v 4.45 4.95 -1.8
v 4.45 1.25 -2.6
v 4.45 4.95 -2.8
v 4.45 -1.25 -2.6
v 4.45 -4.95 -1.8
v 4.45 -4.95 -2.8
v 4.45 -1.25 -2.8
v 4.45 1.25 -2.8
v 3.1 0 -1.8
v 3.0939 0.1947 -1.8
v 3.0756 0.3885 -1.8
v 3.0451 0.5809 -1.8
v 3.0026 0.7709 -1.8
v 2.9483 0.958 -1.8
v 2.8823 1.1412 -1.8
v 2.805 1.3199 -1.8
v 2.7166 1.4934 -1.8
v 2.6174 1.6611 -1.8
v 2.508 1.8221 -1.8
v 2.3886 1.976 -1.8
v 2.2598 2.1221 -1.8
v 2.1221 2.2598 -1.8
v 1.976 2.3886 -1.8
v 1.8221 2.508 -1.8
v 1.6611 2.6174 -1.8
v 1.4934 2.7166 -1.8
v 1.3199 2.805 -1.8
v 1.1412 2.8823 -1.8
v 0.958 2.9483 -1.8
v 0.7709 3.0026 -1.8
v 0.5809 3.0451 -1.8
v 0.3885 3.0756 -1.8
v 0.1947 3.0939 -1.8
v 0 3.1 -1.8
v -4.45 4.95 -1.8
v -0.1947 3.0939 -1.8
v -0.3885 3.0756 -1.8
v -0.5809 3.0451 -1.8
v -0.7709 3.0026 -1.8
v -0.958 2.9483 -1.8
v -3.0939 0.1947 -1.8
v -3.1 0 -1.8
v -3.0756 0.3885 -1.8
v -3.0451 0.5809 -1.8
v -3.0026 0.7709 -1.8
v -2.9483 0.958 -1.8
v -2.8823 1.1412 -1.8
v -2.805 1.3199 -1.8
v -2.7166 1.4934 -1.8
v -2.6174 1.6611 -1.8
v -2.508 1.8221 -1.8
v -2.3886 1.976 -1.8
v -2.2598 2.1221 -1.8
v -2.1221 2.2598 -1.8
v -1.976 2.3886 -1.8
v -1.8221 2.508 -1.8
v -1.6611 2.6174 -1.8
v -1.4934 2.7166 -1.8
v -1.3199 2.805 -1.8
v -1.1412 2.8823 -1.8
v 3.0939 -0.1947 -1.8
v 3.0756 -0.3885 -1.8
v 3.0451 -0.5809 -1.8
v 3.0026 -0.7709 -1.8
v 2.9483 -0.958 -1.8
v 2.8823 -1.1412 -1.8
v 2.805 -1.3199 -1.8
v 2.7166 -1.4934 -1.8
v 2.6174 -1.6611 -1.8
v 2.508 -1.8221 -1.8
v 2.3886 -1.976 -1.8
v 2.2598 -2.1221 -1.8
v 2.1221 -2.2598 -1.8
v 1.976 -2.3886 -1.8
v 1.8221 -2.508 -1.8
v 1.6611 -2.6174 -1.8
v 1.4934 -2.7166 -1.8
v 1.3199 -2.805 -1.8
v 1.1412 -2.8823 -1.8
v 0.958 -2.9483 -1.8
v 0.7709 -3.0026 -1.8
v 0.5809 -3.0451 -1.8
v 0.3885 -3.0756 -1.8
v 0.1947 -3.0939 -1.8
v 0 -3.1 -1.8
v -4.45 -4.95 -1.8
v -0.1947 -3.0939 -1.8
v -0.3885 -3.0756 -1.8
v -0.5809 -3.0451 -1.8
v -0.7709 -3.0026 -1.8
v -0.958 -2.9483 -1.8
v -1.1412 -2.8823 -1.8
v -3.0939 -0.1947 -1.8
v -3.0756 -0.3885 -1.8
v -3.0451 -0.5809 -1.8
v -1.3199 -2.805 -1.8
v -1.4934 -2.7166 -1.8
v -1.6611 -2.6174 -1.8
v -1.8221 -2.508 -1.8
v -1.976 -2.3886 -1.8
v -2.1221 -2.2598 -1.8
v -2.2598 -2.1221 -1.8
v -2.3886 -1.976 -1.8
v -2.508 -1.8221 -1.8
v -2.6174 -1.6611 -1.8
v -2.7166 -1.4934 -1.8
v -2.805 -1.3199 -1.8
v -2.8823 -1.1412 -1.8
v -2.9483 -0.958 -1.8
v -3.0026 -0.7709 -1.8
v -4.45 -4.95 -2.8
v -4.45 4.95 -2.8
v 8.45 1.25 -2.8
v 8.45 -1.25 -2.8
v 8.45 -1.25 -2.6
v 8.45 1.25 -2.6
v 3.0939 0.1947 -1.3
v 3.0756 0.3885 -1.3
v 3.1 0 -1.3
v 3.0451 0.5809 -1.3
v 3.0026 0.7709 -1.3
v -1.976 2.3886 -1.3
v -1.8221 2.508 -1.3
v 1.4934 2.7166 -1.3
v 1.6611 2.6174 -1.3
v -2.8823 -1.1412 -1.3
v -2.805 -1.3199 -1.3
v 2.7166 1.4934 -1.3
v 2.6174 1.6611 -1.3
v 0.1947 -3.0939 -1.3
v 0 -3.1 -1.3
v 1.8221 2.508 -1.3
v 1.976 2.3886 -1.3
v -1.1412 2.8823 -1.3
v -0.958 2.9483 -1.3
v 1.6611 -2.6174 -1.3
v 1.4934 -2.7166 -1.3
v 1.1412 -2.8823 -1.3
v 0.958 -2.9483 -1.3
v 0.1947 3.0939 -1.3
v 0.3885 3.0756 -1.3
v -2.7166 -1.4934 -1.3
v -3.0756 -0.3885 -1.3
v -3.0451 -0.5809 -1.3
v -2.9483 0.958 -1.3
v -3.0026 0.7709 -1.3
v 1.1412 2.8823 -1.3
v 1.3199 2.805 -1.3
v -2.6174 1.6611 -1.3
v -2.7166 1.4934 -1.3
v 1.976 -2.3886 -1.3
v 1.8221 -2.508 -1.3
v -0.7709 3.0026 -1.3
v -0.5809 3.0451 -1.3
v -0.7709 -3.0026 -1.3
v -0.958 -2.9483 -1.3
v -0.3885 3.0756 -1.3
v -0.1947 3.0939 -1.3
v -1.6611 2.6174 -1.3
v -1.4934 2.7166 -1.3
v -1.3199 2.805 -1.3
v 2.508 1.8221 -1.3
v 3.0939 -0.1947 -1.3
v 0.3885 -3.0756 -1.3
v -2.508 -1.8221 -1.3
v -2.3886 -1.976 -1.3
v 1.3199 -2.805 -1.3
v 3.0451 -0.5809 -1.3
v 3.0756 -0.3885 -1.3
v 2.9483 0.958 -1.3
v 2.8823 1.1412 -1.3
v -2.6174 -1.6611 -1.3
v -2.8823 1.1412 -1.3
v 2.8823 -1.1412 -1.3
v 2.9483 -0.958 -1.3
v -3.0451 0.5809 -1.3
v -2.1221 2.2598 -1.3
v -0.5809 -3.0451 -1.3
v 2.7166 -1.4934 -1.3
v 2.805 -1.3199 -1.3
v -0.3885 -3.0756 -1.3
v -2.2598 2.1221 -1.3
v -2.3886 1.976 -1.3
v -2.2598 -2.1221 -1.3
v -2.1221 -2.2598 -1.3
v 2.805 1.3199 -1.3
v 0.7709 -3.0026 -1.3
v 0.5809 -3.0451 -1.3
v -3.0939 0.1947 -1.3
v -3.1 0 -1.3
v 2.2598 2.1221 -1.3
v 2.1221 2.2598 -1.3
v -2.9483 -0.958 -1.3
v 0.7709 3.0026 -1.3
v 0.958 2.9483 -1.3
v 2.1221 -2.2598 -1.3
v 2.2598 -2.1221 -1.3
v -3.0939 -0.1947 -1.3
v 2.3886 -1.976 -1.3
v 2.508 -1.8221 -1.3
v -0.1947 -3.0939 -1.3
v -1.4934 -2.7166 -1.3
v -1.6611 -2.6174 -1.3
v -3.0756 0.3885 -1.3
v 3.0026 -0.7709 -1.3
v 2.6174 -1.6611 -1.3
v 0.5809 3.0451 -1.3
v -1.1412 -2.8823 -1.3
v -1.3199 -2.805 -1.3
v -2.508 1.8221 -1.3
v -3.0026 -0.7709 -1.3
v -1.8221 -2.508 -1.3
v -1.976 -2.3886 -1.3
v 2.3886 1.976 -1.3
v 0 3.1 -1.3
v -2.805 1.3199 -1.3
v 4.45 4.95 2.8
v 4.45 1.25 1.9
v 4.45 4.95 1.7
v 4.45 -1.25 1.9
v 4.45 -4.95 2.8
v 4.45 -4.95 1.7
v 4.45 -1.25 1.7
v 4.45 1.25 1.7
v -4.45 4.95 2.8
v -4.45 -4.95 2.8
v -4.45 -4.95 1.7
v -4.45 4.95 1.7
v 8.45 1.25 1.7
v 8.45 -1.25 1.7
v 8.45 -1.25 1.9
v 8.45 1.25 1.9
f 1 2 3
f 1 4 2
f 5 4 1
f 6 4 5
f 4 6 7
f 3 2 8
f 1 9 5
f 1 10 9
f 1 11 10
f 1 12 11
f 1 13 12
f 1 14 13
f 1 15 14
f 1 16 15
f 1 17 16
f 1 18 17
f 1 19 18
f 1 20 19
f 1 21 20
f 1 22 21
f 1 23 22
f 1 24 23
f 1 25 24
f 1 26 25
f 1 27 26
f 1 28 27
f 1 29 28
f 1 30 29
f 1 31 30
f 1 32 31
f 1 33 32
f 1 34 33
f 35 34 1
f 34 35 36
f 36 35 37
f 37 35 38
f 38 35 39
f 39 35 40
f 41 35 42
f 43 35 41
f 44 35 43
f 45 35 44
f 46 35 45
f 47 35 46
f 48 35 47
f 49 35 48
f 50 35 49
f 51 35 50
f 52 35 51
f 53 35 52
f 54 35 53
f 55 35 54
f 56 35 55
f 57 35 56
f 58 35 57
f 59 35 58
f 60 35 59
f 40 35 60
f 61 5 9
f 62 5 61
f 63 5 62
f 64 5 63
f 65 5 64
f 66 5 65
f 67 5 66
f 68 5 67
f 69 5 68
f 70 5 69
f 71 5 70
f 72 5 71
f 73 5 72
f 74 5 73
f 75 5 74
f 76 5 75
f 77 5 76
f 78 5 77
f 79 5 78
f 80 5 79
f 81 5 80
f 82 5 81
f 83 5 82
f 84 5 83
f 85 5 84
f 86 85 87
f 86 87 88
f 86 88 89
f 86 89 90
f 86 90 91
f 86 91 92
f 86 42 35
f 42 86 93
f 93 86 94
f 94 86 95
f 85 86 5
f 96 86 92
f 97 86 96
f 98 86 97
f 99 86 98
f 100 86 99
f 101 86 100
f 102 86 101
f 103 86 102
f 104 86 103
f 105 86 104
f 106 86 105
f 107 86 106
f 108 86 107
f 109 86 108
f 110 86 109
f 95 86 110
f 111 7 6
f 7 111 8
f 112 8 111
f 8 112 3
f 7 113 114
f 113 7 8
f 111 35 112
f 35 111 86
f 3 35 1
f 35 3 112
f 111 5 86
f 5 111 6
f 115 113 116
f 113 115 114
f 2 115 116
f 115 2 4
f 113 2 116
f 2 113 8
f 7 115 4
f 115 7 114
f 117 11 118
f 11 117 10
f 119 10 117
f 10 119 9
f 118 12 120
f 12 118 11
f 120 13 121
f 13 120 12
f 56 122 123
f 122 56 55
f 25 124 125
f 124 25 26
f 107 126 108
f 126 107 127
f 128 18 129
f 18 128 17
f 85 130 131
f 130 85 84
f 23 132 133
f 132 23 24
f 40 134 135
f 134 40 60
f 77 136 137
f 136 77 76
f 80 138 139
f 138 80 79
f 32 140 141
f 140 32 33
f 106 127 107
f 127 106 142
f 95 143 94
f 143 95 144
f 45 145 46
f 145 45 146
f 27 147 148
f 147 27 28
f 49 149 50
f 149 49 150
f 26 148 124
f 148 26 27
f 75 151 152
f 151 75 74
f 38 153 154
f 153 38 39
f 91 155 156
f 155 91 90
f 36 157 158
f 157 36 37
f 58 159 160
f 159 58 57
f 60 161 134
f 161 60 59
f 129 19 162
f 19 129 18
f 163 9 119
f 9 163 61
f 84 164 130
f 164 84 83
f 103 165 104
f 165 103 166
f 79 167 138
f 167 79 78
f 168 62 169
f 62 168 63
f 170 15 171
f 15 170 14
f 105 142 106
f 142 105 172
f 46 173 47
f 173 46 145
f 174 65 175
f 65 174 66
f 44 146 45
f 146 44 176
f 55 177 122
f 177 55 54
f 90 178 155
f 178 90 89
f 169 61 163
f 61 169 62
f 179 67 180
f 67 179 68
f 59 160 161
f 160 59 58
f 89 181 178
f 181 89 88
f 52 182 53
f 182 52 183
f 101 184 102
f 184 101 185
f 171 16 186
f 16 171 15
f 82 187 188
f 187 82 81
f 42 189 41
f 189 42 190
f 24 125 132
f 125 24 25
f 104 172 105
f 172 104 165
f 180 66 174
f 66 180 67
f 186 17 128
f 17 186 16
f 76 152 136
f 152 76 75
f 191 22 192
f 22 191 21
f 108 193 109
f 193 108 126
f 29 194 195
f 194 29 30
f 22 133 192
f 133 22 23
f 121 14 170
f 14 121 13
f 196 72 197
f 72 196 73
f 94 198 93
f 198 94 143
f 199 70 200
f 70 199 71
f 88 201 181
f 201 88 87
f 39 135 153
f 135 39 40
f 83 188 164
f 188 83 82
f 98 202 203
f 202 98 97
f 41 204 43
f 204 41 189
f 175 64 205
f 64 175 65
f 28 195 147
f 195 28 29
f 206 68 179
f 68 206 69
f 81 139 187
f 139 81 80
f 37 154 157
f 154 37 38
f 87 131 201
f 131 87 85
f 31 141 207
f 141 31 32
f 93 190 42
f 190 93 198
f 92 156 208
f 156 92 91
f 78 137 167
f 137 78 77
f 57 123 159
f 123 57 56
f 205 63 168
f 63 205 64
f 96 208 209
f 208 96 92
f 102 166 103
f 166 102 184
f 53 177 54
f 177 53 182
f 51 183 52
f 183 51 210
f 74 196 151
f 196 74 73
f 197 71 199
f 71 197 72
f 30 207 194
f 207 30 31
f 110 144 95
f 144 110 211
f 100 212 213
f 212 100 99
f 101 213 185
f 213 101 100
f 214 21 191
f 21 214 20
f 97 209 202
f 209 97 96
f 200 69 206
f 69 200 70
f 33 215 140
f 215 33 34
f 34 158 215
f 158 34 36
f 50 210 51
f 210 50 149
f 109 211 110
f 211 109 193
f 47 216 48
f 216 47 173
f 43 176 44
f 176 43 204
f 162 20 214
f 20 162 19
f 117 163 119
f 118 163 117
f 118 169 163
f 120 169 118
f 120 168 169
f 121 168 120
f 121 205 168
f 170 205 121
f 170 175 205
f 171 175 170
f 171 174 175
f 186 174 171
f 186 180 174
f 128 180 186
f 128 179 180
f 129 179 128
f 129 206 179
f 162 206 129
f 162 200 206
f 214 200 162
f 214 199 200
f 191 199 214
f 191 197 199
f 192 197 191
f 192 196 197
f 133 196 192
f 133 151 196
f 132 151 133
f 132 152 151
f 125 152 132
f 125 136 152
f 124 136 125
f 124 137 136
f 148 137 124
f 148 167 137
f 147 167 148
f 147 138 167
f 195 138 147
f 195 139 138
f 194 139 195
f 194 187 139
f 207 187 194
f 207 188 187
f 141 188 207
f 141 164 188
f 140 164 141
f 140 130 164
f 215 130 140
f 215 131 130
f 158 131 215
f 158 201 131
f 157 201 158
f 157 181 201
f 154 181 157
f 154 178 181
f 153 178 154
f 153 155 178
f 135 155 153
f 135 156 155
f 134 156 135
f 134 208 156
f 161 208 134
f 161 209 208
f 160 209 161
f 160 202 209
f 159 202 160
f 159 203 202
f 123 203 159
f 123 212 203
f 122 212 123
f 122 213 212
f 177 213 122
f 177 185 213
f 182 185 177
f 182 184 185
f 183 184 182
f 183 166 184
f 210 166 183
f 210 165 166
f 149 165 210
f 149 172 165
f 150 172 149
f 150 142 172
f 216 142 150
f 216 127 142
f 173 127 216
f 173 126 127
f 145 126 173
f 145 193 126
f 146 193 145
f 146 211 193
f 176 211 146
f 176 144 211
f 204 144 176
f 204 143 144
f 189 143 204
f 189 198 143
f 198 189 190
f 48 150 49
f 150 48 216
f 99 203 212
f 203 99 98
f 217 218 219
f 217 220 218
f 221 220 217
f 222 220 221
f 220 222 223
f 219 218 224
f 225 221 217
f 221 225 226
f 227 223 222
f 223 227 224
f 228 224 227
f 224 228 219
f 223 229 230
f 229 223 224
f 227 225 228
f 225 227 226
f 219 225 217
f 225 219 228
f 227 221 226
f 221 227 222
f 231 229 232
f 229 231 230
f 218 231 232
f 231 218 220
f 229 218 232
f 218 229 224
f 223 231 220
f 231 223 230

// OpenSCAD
debug = ["battery_case"];

$fn=100;

left_box = [8.9,9.9,1.1];
left_pin = [4,2.5,0.2];

right_box = [8.9,9.9,1];
right_pin = [4,2.5,0.2];
right_button_d = 6.2;
right_button_h = 1.5;

battery_h = 3;

function GetBatteryCaseProperty(which) =
    which == "Box" ? left_box :
    which == "Width" ? left_box[2]+right_button_h+battery_h:
    assert(false, str("BatteryCase haven't property ", which));

module left_connector() {
    cube(left_box);
    translate([left_box[0],(left_box[1]-left_pin[1])/2,0])
        cube(left_pin);
}

module right_connector() {
    cube(right_box);
    translate([right_box[0],(right_box[1]-right_pin[1])/2,0])
        cube(right_pin);
    translate([right_box[0]/2,right_box[1]/2,0])
        cylinder(d=right_button_d, h=right_button_h);
}

module battery_case(battery_h = 3) {
    offset_y = (right_button_h-left_box[2])/2;
    translate([0,0,offset_y]) {
    translate([-left_box[0]/2,-left_box[1]/2,
               -right_button_h-battery_h/2]) {
        right_connector();
        translate([0,0,right_button_h+battery_h])
            left_connector();
    }
    }

}

for(val = debug) {
    if(val == "left_connector") {
        left_connector();
    }
    if(val == "right_connector") {
        right_connector();
    }
    if(val == "battery_case") {
        battery_case();
    }
}
